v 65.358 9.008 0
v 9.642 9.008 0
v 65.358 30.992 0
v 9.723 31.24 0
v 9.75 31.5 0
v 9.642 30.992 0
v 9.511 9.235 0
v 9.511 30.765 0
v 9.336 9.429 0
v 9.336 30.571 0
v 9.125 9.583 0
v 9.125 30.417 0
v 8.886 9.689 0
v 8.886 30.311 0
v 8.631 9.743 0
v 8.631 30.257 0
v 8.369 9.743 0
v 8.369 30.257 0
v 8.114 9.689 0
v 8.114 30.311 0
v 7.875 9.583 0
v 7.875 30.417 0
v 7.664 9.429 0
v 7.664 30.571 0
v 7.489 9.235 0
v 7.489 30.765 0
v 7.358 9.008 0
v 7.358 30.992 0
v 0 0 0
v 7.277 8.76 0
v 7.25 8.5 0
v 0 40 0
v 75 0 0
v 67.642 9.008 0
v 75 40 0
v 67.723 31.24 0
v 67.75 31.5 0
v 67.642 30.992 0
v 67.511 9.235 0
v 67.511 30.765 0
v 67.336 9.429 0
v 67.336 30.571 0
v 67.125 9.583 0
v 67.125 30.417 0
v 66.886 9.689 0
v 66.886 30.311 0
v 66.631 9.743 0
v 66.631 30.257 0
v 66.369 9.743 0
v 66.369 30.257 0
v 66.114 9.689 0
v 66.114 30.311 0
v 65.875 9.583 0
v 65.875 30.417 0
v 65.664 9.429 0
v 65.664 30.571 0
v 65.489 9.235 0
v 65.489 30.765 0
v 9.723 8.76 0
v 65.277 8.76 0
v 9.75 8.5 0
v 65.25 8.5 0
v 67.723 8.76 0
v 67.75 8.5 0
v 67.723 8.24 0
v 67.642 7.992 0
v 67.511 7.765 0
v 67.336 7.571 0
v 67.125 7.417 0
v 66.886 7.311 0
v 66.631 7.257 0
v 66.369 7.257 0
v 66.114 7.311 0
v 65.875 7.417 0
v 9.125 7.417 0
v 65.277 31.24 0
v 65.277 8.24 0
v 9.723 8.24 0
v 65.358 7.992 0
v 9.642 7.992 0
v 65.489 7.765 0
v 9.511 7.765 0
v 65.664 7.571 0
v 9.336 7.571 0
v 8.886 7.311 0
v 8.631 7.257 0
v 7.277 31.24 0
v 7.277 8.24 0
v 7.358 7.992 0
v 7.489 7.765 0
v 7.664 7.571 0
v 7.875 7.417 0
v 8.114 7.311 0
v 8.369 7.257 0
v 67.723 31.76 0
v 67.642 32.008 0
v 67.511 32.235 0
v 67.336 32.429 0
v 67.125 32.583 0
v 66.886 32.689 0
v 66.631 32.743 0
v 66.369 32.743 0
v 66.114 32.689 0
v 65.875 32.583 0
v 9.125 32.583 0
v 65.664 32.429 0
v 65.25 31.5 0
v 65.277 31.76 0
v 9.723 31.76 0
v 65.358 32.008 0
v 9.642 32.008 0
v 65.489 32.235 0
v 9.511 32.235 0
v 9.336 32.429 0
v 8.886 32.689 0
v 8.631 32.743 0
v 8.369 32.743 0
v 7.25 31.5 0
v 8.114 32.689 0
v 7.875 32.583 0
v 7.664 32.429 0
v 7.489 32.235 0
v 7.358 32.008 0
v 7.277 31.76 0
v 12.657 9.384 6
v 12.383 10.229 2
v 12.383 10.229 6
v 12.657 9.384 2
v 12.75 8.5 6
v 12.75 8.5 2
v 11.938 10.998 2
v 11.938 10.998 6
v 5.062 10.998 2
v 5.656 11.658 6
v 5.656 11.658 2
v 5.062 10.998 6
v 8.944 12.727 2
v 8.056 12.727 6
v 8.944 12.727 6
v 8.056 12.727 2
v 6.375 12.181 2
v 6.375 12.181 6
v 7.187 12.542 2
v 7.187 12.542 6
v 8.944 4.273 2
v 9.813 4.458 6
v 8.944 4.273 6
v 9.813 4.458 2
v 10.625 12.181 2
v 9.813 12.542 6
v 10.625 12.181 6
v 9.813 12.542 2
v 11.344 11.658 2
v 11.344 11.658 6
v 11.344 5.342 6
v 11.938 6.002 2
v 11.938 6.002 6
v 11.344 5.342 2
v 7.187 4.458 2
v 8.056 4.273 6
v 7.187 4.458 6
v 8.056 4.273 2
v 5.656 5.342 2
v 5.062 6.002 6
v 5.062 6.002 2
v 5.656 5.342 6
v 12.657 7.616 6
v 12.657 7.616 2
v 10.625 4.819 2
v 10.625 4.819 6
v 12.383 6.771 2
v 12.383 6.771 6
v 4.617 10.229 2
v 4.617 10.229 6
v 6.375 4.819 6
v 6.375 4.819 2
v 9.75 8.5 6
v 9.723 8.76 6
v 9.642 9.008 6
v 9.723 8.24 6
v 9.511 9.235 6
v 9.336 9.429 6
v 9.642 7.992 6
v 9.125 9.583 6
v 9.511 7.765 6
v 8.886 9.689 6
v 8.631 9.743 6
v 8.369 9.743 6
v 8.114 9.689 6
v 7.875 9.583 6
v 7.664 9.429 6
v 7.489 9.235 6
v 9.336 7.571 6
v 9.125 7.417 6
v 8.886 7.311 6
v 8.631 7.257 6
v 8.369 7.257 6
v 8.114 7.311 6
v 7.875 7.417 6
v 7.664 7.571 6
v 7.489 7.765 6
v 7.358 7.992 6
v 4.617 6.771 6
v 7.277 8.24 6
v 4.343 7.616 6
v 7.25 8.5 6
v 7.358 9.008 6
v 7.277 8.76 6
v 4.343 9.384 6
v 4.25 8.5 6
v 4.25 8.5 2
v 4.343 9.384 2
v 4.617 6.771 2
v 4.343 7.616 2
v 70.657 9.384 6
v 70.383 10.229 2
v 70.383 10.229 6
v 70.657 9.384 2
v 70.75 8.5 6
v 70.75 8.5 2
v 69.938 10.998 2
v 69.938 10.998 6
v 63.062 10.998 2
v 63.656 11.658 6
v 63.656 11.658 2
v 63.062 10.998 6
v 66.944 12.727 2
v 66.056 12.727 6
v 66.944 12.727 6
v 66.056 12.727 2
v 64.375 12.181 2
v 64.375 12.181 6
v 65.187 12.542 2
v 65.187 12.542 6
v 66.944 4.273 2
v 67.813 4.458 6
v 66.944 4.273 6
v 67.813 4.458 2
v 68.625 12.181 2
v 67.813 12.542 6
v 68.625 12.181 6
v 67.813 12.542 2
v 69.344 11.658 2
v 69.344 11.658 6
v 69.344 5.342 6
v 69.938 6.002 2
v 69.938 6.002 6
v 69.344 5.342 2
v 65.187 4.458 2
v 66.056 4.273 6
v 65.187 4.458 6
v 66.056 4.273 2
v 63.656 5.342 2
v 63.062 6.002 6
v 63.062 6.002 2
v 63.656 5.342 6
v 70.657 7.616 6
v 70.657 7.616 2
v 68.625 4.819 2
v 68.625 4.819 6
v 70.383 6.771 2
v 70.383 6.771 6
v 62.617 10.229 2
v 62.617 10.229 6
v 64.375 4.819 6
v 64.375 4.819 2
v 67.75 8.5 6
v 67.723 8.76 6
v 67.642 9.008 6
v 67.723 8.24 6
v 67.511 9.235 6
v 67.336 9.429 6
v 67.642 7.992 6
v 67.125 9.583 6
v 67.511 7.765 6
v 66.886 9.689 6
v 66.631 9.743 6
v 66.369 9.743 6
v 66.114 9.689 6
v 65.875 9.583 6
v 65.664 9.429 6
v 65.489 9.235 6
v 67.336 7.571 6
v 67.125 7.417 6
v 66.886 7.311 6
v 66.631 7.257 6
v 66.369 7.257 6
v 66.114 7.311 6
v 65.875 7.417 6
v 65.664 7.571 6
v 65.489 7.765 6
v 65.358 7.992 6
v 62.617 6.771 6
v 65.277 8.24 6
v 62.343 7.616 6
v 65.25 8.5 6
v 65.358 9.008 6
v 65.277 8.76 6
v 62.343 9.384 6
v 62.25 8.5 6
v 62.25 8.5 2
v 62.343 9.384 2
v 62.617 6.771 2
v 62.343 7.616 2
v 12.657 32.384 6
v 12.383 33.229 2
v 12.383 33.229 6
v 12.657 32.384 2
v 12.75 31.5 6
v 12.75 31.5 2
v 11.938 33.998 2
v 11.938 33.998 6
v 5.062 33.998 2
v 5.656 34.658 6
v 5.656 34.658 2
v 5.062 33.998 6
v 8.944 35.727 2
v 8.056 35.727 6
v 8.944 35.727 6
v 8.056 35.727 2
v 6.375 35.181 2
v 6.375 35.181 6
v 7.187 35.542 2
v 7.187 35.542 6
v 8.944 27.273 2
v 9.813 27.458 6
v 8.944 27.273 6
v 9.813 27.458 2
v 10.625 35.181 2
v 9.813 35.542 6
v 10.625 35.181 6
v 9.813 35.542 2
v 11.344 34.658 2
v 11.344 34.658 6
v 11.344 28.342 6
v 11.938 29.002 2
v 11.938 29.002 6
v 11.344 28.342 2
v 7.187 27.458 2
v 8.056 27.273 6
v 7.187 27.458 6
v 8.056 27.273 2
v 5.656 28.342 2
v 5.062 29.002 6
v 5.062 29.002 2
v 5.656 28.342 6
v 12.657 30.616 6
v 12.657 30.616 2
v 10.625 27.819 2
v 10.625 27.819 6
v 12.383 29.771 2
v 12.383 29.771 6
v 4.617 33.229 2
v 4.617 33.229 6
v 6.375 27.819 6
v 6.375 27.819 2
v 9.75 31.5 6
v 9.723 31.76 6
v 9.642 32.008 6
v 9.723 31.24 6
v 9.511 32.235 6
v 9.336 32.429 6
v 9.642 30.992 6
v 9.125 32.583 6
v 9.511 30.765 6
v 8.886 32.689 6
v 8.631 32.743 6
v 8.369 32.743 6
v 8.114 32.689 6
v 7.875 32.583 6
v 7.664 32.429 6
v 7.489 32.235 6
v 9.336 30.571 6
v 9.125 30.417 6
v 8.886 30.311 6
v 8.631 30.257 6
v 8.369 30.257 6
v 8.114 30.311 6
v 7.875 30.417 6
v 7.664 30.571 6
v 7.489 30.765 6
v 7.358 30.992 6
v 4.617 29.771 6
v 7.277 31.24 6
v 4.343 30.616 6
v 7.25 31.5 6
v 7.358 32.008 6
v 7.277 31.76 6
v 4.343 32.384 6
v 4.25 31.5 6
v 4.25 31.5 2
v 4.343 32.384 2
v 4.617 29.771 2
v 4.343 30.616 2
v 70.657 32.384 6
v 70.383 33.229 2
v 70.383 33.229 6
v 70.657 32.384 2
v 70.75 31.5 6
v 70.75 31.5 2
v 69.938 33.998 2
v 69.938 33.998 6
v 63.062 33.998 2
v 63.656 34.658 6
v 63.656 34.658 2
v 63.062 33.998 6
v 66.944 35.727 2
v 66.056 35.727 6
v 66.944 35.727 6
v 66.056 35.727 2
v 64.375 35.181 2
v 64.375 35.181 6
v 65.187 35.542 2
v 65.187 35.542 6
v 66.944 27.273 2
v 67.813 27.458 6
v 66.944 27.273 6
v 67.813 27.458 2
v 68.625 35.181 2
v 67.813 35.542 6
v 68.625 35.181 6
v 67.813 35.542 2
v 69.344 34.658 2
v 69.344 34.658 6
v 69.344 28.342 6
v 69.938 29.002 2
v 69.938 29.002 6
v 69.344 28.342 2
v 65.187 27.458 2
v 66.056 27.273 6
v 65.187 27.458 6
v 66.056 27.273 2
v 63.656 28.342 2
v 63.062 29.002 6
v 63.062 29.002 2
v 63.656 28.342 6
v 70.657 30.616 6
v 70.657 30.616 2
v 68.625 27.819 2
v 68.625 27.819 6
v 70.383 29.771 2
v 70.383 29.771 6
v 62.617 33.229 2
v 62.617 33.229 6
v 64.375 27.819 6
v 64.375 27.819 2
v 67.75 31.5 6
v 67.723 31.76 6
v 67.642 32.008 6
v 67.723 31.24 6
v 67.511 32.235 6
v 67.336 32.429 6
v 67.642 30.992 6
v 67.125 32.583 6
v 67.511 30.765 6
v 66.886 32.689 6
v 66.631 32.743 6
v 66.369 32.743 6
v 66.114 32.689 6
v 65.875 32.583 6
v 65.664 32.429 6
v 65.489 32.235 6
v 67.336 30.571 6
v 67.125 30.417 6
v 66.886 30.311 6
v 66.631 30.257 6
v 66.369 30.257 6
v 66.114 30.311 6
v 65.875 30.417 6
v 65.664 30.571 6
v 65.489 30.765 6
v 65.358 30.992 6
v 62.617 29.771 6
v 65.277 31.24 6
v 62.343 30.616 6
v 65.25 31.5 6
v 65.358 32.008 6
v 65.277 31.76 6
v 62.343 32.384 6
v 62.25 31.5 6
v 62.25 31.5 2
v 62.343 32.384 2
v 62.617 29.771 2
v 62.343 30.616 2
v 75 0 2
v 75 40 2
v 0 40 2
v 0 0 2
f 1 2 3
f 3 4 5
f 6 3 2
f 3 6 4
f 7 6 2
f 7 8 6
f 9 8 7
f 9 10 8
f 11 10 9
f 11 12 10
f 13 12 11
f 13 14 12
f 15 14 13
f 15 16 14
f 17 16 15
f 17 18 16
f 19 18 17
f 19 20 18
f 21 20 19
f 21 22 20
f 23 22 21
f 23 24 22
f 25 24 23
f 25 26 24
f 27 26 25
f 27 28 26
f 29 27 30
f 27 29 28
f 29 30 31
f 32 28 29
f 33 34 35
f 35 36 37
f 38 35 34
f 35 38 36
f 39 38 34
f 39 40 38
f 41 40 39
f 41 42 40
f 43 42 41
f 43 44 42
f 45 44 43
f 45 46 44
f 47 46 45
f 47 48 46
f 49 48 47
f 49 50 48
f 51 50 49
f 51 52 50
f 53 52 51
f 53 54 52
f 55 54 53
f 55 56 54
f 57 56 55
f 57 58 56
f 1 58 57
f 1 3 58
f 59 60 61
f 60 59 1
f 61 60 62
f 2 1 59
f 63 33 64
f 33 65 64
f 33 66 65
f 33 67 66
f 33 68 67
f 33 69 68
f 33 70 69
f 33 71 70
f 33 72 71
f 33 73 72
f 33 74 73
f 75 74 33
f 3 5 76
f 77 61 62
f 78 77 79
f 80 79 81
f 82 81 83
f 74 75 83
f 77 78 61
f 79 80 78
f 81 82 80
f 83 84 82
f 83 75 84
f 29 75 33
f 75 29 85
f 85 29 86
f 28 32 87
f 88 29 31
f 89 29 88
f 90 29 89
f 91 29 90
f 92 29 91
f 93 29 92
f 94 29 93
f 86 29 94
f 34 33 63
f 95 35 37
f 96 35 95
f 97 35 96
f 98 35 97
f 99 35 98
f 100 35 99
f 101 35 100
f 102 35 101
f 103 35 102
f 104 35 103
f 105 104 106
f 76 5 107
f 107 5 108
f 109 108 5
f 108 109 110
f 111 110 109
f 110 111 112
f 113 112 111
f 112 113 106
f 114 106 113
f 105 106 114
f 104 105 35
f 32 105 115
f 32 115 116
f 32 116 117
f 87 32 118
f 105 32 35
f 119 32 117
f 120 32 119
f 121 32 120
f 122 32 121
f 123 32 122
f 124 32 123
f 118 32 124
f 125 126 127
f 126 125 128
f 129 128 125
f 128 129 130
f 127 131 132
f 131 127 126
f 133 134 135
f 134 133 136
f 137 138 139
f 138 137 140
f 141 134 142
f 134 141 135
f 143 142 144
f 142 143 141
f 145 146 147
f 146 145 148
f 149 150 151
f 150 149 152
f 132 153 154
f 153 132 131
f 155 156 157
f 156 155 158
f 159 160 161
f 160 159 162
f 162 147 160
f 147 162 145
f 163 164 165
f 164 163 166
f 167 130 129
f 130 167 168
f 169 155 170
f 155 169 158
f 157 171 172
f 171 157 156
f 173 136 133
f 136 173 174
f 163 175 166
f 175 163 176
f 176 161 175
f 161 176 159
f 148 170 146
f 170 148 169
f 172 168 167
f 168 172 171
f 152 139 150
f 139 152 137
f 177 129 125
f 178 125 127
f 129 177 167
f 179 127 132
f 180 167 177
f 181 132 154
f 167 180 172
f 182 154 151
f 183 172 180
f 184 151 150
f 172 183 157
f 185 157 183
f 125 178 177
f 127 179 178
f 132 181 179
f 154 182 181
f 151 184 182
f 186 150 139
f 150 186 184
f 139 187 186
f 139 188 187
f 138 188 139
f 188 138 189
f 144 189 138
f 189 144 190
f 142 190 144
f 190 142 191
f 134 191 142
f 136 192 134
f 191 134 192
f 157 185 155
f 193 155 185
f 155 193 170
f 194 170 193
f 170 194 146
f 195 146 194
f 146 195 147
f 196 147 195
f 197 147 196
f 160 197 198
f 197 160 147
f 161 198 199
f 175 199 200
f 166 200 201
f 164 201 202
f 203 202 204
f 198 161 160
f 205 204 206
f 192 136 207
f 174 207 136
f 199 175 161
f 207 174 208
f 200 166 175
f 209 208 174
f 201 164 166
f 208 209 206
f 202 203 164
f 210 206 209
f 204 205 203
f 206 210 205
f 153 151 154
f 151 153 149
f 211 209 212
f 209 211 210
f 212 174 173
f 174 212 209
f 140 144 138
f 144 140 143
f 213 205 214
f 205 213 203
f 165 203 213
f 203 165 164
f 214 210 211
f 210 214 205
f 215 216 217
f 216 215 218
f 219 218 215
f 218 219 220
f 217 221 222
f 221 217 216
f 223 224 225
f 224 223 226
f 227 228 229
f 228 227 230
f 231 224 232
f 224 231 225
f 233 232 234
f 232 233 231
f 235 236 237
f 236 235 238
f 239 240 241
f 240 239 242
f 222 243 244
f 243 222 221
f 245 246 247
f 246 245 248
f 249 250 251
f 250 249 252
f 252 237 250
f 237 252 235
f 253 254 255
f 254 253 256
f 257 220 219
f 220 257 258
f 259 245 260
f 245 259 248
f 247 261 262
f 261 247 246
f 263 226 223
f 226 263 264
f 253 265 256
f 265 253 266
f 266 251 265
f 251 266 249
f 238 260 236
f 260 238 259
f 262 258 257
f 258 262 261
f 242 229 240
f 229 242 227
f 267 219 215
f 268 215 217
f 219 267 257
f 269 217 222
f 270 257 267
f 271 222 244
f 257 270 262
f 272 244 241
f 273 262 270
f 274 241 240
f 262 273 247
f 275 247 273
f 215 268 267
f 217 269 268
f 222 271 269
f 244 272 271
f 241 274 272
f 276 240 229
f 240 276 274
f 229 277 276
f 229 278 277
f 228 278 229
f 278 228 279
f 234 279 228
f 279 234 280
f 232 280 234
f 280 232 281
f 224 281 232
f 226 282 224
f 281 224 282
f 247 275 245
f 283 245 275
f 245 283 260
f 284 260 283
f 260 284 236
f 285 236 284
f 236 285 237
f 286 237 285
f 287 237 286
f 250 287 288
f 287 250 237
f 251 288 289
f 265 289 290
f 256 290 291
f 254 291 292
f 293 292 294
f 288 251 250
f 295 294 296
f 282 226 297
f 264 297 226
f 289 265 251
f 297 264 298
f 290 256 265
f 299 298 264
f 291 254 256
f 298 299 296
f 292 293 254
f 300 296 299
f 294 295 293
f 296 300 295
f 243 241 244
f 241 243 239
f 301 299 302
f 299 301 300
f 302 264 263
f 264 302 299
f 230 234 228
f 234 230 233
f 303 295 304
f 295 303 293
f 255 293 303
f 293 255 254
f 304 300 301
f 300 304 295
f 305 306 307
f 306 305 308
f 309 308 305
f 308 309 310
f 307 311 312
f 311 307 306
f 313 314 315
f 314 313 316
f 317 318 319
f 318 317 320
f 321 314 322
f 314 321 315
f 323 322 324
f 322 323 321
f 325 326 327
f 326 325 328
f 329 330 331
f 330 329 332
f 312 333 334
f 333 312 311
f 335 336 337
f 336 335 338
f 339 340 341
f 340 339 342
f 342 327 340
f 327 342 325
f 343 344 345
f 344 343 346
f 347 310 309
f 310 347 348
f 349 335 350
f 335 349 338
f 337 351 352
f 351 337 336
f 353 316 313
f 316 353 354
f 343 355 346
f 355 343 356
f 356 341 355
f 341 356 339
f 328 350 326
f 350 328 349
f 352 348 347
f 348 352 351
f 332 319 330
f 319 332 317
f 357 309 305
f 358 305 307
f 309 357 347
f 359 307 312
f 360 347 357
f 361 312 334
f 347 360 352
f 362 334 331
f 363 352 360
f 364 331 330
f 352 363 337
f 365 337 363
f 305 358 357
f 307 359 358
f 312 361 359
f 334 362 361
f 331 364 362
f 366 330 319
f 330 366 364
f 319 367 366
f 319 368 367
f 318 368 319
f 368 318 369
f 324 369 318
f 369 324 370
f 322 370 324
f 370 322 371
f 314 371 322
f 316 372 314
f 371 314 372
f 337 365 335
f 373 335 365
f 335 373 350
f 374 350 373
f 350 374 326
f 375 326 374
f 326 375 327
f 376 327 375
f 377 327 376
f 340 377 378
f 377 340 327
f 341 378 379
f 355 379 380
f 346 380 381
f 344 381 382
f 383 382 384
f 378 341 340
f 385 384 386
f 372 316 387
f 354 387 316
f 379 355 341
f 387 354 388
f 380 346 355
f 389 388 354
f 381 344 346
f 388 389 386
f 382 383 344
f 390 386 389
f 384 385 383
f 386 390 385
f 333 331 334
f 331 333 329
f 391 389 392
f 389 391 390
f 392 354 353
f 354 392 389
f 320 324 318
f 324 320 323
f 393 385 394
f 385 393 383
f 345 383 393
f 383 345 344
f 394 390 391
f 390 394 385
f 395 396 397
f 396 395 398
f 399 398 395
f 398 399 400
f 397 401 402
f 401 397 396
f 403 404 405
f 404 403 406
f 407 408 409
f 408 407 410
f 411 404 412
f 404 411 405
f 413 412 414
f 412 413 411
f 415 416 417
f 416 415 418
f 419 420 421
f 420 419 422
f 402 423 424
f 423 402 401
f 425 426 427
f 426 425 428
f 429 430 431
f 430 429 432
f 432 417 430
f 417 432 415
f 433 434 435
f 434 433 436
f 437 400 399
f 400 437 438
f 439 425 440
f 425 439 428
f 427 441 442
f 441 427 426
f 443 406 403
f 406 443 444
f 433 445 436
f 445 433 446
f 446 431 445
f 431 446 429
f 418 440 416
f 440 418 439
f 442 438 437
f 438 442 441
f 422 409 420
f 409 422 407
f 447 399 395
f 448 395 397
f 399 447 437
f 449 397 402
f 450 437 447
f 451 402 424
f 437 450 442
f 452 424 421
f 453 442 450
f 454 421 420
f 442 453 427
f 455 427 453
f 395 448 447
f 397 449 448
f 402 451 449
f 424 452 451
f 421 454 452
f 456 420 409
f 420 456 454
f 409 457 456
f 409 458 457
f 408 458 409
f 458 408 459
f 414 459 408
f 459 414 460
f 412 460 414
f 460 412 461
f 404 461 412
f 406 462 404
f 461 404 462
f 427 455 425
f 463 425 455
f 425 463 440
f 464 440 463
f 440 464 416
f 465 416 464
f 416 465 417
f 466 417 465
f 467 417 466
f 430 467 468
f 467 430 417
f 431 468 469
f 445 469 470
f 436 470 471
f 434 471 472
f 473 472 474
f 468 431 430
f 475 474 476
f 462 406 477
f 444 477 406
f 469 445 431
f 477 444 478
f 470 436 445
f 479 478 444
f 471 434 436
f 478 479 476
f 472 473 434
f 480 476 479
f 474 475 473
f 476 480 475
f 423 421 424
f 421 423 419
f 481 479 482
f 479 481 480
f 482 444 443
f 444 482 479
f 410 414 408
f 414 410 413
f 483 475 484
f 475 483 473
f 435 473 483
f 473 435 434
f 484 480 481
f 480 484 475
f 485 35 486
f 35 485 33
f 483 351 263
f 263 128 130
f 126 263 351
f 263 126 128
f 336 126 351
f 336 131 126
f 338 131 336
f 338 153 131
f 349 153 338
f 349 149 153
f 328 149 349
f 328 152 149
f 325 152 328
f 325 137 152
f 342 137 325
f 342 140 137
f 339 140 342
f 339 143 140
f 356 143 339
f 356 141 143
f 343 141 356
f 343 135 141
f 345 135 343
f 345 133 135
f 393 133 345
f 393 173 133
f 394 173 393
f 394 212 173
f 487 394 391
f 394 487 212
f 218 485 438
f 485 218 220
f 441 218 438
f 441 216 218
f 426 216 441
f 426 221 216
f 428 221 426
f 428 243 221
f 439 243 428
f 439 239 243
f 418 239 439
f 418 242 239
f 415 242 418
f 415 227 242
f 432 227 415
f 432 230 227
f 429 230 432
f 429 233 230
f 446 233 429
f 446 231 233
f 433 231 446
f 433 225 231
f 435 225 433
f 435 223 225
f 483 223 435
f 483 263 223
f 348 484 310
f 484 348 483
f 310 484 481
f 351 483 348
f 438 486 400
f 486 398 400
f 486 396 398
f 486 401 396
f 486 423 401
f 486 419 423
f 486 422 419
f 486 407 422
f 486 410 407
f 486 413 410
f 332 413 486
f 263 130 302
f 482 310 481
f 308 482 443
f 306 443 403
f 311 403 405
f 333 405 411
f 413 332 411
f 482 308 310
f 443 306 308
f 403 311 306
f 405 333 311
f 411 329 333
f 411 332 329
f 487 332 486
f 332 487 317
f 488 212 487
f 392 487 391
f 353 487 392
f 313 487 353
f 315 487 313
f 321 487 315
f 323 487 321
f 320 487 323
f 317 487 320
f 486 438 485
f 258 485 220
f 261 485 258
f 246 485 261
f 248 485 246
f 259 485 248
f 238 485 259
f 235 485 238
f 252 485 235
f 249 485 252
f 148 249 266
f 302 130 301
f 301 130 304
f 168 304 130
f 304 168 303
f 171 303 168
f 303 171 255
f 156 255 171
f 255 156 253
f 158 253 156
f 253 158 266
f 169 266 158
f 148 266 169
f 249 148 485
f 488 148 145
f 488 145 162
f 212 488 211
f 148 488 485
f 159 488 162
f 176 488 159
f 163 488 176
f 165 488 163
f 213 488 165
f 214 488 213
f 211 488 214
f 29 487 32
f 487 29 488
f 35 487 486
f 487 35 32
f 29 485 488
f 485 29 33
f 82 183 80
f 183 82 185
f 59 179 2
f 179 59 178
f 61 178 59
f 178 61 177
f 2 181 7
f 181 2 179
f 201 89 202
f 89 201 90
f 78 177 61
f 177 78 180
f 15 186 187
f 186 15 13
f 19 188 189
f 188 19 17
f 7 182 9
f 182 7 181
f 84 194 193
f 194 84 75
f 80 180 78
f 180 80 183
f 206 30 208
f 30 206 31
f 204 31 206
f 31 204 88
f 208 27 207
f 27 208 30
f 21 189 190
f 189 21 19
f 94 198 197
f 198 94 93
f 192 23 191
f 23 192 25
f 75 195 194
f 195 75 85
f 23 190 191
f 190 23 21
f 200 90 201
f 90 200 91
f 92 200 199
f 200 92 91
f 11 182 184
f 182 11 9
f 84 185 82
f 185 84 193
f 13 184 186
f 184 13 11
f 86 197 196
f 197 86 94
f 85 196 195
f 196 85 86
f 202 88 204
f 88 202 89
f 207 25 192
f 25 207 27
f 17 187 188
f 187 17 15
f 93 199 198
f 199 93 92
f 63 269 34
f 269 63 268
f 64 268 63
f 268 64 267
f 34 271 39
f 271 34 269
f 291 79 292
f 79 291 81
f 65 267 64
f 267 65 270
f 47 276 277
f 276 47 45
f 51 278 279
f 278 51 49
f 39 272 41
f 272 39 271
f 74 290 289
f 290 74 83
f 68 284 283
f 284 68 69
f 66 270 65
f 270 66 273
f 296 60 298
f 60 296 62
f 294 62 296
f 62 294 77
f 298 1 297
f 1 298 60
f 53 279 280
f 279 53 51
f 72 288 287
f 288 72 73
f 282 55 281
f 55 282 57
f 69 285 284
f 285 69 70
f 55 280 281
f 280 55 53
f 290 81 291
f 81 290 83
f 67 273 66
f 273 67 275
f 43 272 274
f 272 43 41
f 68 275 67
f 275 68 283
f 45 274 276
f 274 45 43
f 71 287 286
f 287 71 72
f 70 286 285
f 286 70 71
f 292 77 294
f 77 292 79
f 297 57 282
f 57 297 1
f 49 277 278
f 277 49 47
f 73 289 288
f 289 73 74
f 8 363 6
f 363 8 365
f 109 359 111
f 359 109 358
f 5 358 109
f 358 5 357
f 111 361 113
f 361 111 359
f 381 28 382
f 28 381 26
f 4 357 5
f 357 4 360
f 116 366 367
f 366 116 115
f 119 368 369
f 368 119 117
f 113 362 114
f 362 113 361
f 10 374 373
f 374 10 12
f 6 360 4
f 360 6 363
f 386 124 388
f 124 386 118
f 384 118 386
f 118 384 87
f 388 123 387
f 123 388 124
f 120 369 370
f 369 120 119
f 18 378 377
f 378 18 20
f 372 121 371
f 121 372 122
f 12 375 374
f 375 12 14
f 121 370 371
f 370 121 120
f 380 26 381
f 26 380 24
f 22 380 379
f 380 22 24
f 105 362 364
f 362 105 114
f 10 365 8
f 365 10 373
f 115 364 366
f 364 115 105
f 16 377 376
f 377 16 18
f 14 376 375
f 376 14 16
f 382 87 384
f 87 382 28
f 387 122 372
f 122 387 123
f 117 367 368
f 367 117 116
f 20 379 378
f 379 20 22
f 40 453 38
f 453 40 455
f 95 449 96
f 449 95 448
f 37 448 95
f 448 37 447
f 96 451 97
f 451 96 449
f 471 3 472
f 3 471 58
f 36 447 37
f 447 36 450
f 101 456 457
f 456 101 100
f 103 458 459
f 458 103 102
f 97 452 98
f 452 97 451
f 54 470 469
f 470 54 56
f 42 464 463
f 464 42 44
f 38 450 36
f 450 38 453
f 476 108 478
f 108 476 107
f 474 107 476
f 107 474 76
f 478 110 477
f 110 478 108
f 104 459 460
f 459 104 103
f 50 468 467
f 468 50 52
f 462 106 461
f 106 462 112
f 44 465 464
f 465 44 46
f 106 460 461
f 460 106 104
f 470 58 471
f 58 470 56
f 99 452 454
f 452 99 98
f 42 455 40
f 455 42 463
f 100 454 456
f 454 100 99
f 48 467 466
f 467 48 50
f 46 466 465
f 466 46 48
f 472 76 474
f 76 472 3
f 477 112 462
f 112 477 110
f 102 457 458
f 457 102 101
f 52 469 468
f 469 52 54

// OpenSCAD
// file: slice.scad
$fn = 30;

module slice(width = 75, height = 40, thickness = 2, standoff = 4, lug = 3, holes = []) {
  difference() {
    union() {
      cube([width, height, thickness]);
      for (hole = holes) {
	translate([(width/2)+hole[0], (height/2)+hole[1], 0]) cylinder(r = (hole[2] + lug), h = thickness + standoff, $fn = $fn);
      }
    }
    union() {
      for (hole = holes) {
	translate([(width/2)+hole[0], (height/2)+hole[1], 0]) cylinder(r = hole[2], h = thickness + standoff, $fn = $fn);
      }
    }
  }
}
// main file
include<slice.scad>

$fn = 30;

width = 58;
depth = 23;

fl = [-width / 2, -depth / 2];
fr = [width / 2, -depth / 2];
rl = [-width / 2, depth / 2];
rr = [width / 2, depth / 2];

hole_radius = 2.5 / 2;

slice(
								holes = [
								[fl[0],fl[1],hole_radius],
								[fr[0],fr[1],hole_radius],
								[rl[0],rl[1],hole_radius],
								[rr[0],rr[1],hole_radius],
								]);
